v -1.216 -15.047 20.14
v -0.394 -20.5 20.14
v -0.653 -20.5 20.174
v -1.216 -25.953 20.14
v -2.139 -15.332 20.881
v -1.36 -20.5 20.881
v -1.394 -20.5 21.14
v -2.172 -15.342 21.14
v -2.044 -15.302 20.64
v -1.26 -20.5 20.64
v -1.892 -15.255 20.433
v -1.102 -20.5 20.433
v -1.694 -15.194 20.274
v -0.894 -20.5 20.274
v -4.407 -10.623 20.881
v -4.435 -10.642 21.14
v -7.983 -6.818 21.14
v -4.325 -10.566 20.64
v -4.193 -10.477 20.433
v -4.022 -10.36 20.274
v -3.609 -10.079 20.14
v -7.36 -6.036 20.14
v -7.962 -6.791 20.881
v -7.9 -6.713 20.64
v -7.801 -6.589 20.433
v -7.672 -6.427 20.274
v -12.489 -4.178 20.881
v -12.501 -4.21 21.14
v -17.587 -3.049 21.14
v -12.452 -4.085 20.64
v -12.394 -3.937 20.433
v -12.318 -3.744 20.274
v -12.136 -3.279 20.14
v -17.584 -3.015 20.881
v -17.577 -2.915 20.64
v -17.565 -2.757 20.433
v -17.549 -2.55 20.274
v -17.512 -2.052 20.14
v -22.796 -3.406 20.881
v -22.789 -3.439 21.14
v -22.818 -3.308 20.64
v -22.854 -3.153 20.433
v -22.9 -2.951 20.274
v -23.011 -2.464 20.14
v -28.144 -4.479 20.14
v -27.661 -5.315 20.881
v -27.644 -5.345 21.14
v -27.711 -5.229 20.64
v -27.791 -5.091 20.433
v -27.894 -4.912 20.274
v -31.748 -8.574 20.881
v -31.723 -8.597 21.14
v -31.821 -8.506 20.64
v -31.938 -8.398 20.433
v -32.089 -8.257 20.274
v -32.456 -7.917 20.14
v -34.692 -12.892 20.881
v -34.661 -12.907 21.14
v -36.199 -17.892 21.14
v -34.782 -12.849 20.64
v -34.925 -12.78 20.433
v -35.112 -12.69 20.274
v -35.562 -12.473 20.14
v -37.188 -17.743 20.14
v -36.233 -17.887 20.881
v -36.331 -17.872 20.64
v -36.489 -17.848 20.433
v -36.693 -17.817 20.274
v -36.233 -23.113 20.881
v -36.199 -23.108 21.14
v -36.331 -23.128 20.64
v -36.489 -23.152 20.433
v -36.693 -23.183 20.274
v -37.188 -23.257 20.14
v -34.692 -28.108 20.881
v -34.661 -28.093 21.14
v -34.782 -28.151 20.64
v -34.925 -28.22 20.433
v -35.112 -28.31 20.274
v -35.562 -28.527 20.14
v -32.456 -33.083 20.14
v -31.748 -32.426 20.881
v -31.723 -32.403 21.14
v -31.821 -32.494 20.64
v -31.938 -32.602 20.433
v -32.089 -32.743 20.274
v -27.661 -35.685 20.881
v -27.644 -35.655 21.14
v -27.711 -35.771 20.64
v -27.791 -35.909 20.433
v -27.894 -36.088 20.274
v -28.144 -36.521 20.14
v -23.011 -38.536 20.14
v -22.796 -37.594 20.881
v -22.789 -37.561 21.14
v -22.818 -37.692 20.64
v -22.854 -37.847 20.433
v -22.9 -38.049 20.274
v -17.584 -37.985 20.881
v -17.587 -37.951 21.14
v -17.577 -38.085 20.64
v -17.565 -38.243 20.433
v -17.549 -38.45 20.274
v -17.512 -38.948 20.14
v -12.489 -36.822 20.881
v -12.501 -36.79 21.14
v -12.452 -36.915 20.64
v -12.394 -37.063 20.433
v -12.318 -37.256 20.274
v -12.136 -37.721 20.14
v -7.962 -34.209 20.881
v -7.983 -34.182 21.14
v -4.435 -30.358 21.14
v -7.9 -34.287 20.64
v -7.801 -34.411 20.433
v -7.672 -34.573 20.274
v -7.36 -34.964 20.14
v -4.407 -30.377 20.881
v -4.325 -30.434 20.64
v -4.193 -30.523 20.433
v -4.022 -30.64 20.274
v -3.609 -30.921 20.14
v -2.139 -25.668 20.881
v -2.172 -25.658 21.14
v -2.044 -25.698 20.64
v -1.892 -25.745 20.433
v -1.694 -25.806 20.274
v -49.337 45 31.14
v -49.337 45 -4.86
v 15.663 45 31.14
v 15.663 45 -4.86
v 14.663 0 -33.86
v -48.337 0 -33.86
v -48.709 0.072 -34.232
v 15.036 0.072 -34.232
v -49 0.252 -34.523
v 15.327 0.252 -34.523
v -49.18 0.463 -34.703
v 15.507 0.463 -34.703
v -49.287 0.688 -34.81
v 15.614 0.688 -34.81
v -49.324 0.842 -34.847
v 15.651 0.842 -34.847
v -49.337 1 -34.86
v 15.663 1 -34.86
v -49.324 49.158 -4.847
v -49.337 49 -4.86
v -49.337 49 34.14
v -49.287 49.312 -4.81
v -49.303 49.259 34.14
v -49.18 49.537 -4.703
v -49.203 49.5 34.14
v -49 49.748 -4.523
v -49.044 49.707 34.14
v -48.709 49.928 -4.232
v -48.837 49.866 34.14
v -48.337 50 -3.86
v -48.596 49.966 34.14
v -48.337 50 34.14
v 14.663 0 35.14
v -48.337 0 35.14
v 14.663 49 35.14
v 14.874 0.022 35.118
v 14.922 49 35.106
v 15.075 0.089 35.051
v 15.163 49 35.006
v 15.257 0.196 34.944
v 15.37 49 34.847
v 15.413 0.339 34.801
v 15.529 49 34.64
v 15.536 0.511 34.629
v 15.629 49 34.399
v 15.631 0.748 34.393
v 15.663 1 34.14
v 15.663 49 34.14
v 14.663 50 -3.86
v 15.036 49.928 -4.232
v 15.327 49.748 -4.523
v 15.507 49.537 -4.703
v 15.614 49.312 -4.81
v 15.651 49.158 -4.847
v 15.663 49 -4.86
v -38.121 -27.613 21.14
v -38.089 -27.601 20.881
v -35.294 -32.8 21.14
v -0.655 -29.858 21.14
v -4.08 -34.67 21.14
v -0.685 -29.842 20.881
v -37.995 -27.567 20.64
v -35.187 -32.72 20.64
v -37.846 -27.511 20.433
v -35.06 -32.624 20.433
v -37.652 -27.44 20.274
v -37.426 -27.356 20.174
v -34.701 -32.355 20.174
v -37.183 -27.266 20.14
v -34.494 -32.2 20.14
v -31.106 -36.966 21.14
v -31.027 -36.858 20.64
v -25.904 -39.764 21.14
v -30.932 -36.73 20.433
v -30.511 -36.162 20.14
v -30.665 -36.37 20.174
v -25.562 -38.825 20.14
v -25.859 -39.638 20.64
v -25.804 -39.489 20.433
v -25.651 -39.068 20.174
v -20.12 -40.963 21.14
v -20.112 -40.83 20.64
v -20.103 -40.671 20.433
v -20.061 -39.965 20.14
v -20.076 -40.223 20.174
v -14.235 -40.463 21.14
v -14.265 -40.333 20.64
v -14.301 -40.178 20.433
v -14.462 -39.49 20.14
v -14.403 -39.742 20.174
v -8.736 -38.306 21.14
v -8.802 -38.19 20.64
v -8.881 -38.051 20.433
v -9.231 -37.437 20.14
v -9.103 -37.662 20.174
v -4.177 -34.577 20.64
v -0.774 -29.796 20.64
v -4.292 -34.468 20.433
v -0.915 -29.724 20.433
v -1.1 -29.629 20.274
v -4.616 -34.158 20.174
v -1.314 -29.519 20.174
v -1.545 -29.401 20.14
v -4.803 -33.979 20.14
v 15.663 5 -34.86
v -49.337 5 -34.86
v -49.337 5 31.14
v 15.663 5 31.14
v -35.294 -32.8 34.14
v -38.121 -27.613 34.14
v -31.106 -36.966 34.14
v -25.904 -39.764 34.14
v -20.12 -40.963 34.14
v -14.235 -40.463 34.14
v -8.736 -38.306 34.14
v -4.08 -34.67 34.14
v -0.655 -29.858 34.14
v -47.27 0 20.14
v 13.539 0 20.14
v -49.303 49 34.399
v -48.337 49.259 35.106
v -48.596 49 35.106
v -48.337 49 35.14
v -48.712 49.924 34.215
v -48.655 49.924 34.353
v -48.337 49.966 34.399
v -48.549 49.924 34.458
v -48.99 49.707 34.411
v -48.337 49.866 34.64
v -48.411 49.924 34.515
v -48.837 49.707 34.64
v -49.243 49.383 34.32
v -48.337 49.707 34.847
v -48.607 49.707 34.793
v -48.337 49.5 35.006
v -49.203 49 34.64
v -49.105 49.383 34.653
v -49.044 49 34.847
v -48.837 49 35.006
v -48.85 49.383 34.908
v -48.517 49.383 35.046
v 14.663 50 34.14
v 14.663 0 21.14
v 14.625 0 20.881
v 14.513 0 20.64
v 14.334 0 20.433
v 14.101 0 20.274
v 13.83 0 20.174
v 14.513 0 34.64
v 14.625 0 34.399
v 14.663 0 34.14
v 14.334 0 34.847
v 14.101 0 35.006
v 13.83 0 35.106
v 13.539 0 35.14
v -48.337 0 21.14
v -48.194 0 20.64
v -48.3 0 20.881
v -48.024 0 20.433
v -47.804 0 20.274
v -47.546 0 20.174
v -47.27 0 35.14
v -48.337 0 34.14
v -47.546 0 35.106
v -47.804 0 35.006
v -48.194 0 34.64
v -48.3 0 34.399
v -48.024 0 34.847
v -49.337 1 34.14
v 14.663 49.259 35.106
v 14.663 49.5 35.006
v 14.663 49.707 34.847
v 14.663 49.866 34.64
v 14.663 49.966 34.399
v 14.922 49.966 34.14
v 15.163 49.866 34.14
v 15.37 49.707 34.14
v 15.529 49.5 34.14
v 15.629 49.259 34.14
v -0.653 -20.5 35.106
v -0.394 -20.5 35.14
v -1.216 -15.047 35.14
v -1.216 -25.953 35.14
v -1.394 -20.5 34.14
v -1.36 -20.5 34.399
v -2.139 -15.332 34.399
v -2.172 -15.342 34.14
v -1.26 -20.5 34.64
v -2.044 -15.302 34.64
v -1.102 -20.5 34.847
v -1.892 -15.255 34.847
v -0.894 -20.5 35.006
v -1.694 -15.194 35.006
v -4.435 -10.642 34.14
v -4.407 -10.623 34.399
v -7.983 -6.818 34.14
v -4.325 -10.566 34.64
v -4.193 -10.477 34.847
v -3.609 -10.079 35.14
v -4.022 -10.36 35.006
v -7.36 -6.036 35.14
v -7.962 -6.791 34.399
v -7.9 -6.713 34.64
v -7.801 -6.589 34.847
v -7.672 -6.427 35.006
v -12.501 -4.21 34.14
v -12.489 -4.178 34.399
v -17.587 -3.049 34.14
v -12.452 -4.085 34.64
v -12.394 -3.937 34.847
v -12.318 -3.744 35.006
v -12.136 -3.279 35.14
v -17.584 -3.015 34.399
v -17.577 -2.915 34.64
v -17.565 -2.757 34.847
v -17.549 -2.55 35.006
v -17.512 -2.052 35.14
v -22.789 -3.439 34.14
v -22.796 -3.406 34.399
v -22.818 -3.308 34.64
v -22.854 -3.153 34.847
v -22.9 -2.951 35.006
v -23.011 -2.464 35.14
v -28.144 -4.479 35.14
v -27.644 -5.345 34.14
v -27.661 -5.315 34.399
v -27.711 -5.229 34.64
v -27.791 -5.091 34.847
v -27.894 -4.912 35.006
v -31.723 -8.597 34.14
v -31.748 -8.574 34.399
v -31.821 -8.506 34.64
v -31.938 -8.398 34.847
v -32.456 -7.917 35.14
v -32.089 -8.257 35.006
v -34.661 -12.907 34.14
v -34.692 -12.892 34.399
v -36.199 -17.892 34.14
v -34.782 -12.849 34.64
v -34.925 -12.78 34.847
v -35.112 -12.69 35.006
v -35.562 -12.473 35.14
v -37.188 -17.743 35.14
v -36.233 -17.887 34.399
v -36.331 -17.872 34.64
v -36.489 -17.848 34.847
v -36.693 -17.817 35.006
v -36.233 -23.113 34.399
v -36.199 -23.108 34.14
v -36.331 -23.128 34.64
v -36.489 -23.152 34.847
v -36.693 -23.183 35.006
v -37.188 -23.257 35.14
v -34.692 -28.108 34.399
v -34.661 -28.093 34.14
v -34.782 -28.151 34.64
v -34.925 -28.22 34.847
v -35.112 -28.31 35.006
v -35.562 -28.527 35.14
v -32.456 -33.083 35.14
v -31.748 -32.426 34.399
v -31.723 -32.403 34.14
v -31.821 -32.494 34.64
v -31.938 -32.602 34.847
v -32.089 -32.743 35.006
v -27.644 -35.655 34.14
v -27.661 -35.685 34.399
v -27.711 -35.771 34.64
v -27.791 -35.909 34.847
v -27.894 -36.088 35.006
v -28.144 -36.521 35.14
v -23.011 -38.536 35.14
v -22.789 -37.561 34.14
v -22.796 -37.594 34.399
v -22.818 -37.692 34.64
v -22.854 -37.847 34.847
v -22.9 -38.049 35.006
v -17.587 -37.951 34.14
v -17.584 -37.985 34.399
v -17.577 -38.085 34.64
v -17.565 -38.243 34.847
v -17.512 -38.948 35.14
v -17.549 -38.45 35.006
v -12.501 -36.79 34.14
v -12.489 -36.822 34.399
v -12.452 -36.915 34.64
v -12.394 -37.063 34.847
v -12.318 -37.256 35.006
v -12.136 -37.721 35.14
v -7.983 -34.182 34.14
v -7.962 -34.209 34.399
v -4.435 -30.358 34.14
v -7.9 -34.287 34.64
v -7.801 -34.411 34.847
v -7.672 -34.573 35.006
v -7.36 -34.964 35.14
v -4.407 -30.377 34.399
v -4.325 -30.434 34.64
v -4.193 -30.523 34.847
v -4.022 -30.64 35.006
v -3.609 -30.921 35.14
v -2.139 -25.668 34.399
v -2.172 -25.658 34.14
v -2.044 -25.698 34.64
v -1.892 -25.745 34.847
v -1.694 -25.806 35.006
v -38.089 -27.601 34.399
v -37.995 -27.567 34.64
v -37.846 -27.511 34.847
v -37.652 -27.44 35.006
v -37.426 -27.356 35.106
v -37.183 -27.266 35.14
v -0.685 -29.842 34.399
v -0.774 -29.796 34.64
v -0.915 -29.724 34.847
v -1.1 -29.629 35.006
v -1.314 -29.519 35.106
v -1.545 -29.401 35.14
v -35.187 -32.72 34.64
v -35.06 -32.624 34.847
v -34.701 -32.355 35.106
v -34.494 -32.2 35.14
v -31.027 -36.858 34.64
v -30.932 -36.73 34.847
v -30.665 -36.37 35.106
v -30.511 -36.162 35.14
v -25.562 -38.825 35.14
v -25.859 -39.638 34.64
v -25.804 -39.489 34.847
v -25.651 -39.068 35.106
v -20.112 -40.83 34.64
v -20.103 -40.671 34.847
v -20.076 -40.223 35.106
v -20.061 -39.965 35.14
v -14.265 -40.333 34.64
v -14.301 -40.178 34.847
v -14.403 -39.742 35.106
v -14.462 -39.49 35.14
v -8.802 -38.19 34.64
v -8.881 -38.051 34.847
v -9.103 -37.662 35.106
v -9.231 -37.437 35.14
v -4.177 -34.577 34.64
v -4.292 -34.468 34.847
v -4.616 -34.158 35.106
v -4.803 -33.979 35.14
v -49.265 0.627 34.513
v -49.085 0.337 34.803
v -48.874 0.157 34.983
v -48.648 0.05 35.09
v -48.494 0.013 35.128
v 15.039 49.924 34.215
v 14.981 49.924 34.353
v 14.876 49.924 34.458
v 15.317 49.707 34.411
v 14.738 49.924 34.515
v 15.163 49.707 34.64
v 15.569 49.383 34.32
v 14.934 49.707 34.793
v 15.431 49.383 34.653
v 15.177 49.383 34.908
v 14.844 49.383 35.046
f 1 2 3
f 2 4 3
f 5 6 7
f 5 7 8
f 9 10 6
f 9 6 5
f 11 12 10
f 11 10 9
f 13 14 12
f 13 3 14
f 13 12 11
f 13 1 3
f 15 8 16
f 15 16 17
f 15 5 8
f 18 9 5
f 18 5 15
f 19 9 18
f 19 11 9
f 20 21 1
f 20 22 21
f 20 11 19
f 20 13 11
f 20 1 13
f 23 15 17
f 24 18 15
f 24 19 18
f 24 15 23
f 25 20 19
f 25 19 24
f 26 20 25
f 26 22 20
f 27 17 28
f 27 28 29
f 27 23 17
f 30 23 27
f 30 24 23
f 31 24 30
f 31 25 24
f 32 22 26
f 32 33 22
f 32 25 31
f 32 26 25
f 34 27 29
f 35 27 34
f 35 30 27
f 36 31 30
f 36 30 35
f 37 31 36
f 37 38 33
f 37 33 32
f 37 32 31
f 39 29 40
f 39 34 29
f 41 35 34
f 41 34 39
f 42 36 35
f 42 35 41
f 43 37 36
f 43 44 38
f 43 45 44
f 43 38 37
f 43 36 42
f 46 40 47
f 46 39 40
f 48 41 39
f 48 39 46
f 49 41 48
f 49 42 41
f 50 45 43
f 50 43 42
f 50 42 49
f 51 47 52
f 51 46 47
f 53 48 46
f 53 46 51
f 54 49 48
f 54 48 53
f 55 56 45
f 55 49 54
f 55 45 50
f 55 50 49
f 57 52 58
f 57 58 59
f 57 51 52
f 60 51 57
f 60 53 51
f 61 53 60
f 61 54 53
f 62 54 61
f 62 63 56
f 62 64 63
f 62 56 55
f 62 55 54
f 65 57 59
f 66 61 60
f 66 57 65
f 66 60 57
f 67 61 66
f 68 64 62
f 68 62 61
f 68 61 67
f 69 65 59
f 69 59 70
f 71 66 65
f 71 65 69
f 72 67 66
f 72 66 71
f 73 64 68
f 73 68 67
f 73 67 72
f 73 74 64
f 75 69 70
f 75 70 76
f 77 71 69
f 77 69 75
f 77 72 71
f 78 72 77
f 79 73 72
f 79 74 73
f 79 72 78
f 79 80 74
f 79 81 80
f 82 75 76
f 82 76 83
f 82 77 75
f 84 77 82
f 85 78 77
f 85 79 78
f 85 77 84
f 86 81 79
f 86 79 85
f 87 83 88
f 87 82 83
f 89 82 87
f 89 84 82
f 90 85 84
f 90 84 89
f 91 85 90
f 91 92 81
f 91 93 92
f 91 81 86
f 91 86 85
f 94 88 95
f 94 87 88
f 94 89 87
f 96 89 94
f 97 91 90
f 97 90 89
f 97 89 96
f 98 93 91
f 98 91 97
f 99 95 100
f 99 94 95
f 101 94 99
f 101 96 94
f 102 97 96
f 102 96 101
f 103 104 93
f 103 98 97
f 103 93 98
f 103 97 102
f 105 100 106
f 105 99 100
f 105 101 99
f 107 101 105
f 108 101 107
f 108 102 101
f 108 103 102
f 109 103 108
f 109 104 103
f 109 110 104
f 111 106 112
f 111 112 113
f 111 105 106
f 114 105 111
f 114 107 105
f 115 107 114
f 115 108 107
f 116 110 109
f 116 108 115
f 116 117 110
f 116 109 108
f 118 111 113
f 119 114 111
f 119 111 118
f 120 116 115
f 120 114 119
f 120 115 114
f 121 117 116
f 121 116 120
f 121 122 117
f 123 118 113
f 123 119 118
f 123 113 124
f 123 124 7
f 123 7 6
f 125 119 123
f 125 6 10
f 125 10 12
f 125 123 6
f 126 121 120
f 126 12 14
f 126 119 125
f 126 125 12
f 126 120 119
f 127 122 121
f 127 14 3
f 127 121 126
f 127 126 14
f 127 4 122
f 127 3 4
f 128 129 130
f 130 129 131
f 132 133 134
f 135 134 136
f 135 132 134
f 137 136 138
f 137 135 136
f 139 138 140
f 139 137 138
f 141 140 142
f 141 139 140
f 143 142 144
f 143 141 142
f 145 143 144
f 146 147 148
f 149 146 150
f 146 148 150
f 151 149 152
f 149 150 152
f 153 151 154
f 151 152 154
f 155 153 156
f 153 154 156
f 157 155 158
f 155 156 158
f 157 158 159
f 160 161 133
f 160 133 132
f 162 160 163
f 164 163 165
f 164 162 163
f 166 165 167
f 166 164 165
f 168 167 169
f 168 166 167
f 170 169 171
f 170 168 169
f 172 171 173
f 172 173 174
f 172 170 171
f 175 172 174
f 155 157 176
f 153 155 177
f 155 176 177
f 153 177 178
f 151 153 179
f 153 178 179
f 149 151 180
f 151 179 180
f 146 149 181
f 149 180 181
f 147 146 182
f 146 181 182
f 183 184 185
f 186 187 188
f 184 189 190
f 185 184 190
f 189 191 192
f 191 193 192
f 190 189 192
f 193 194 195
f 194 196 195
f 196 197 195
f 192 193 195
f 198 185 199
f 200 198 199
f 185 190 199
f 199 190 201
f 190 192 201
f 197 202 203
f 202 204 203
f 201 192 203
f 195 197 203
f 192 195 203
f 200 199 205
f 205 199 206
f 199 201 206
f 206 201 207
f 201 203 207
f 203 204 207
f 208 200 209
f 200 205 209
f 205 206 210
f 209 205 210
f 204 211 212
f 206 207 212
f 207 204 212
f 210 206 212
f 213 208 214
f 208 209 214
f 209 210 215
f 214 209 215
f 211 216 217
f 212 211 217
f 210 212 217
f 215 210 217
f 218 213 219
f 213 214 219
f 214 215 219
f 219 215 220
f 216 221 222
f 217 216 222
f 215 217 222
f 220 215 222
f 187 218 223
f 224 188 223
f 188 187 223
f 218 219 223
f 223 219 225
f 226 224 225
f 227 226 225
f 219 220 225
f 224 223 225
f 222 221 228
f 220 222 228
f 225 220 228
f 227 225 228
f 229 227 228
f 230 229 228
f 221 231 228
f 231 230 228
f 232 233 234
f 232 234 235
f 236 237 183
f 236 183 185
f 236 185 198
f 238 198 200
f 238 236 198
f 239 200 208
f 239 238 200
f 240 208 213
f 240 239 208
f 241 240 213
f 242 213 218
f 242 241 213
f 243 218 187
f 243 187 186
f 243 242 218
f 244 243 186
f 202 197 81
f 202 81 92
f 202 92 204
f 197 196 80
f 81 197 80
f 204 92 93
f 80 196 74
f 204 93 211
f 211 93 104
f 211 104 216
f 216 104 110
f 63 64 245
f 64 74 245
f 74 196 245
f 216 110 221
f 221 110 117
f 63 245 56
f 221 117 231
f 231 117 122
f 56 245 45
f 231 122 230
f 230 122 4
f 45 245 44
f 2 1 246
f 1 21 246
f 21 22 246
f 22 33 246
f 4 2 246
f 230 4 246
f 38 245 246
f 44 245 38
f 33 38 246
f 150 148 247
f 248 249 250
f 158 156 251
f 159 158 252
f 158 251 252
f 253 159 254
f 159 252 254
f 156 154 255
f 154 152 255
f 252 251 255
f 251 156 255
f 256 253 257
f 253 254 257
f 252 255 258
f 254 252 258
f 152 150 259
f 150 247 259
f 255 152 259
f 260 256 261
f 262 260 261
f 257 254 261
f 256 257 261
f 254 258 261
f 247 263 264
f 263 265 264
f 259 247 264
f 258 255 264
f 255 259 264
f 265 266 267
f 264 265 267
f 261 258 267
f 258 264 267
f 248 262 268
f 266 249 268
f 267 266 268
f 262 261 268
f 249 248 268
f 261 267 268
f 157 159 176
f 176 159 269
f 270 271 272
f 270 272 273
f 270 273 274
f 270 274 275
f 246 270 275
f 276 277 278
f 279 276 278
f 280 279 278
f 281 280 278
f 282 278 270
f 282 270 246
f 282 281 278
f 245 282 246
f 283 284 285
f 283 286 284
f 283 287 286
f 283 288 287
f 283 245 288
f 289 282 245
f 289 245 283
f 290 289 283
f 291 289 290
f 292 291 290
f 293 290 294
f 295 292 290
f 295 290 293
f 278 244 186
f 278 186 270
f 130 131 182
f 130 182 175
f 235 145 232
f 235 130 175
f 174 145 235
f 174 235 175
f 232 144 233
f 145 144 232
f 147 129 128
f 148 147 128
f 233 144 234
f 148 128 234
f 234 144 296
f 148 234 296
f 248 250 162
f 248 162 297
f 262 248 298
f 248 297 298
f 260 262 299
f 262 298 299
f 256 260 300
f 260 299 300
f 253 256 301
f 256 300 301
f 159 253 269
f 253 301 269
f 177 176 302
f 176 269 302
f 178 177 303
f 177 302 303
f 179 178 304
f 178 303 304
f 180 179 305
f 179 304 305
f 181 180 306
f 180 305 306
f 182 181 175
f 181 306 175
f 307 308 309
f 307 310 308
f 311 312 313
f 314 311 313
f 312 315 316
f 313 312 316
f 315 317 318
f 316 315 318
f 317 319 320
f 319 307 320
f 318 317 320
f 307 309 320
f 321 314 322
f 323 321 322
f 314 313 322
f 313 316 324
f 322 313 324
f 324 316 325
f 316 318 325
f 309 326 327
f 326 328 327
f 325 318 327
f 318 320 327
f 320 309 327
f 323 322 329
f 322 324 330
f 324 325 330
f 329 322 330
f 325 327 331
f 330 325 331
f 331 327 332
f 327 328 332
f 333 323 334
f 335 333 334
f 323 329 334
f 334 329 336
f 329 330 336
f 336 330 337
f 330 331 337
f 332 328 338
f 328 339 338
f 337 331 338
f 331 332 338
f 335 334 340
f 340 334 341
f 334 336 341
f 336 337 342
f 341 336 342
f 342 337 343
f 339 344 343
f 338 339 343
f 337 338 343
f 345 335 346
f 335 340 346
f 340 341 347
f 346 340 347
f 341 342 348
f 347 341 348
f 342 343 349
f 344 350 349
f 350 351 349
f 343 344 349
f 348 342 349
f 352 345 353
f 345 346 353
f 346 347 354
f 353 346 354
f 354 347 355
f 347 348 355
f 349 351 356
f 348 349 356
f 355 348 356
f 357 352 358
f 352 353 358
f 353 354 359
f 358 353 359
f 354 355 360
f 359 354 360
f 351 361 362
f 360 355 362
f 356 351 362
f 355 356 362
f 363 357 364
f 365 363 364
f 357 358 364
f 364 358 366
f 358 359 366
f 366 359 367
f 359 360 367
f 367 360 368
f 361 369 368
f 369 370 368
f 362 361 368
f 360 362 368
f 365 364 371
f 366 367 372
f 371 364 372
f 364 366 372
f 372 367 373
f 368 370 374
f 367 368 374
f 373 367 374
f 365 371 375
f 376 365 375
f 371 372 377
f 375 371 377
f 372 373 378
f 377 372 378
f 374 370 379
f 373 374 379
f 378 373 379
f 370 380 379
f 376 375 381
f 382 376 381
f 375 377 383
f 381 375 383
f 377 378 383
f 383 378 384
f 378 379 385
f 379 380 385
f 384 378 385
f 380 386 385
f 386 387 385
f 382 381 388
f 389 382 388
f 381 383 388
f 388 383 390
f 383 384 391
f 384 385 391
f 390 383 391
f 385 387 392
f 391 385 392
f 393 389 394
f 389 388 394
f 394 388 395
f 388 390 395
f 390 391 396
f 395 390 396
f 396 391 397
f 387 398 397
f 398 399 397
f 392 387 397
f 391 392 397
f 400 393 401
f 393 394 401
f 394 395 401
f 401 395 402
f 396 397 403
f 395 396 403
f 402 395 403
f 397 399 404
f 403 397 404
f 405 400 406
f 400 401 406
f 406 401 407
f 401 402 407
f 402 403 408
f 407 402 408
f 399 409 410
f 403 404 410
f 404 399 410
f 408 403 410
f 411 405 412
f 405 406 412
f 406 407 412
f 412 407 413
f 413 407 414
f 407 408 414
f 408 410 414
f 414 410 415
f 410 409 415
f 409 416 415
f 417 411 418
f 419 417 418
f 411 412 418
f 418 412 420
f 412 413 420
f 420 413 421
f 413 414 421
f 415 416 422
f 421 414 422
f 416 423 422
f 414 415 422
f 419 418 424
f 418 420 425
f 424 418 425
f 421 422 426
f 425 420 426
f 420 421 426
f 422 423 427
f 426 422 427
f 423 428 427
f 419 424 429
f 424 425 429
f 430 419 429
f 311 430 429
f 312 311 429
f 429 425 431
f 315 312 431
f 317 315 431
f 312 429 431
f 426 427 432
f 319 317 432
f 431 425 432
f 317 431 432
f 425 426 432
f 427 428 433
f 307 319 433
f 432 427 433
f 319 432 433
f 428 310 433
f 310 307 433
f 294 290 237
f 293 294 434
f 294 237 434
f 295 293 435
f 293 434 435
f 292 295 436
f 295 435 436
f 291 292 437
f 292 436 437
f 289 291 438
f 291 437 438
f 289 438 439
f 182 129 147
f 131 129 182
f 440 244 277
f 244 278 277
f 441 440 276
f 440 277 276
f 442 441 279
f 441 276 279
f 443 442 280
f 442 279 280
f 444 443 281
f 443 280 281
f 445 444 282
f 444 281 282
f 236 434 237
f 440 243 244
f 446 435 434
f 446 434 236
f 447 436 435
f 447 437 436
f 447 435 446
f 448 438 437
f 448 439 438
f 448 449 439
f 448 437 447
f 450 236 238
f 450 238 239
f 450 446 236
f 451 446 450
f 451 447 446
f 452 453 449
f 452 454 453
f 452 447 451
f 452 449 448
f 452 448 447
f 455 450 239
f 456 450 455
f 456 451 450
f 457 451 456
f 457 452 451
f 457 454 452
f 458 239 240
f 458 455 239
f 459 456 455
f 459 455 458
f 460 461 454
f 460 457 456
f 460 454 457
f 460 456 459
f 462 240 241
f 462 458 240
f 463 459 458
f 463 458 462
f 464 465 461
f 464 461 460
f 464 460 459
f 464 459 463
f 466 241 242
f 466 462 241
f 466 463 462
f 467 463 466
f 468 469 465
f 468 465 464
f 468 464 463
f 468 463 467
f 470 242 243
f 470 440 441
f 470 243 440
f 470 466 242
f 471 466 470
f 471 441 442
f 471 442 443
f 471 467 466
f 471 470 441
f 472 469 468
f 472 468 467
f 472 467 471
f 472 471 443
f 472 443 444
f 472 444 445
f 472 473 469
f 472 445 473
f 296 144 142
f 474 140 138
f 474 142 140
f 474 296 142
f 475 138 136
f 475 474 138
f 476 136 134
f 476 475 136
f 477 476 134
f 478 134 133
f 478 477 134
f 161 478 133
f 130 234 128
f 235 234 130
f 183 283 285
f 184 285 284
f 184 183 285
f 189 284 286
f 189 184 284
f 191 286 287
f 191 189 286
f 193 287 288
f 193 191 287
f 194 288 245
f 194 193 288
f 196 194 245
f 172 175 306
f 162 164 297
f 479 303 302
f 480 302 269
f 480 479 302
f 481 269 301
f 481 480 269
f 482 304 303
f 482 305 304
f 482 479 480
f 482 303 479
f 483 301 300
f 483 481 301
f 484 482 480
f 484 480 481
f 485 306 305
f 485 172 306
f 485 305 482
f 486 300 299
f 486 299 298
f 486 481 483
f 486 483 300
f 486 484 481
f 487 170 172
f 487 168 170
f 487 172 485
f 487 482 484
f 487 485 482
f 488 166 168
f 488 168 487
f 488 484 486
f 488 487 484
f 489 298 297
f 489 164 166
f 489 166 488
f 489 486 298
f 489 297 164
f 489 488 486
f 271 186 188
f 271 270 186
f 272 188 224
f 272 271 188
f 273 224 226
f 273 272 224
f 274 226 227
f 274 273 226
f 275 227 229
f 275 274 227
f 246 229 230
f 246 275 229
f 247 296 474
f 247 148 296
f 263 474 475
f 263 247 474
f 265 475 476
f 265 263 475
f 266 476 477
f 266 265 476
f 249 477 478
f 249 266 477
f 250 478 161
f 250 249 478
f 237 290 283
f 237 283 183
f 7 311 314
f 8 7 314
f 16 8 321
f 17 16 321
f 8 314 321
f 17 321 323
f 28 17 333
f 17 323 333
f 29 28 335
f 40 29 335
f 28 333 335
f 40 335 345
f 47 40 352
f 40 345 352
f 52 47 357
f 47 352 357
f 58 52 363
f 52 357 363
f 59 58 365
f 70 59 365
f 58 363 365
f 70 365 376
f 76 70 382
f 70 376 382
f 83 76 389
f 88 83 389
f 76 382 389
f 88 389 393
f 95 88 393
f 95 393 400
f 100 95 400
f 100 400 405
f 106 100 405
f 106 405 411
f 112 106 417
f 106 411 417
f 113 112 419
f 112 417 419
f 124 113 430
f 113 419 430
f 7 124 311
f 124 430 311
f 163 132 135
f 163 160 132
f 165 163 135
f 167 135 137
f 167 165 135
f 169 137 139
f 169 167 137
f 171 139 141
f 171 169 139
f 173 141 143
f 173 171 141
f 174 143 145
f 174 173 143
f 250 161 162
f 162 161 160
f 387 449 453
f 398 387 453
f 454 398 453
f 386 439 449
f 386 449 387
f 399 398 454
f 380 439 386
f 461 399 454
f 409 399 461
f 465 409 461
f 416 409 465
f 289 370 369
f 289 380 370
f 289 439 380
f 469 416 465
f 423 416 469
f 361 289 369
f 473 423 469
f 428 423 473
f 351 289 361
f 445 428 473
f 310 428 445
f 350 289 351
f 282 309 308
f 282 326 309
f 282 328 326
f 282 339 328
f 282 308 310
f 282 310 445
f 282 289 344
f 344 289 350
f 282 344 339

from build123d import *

# Parameters (mm, degrees)
F0_W     = 65
F0_H     = 70
F1_DEPTH = 50
F2_W     = 65
F2_H     = 40
F3_DEPTH = 66
F4_DEPTH = 30
F5_R     = 17.5
F6_DEPTH = 25
F7_DEPTH = 15
F8_R     = 1
F8_2_R   = 1


with BuildPart() as f1:
    # F0 (on Front) → F1 (new body)
    with BuildSketch(Plane.XZ):
        with Locations((-16.8366907164, 0.1400746397)):
            Rectangle(F0_W, F0_H)
    extrude(amount=-F1_DEPTH)

    # F2 (on face) → F3 (cut, through all)
    with BuildSketch(Plane(origin=(0, 0, -34.8599253603), x_dir=(1, 0, 0), z_dir=(0, 0, -1))):
        with Locations((-16.8366907164, -25)):
            Rectangle(F2_W, F2_H)
    extrude(amount=-F3_DEPTH, mode=Mode.SUBTRACT)

    # F4 (cut, through all): a face of the model
    f4_faces = [f1.faces().sort_by_distance(p)[0] for p in [
        (-16.8366907164, 47.5, -34.8599253603),
    ]]
    extrude(f4_faces, amount=-F4_DEPTH, mode=Mode.SUBTRACT)

    # F5 (on face) → F6 (cut)
    with BuildSketch(Plane.XY.offset(35.1400746397)):
        with Locations((-18.8944296206, -20.5)):
            Circle(F5_R)
    extrude(amount=-F6_DEPTH, mode=Mode.SUBTRACT)

    # F8#2
    f8_2_edges = [f1.edges().sort_by_distance(p)[0] for p in [
        (15.663309, 25, 35.140075),
        (-49.336691, 25, 35.140075),
        (-16.836691, 50, -4.859925),
        (15.663309, 50, 15.140075),
        (-49.336691, 50, 15.140075),
        (-16.836691, 0, -34.859925),
        (-16.836691, 50, 35.140075),
        (-49.336691, 0, 0.140075),
        (15.663309, 0, 0.140075),
    ]]
    fillet(f8_2_edges, radius=F8_2_R)


with BuildPart() as f7:
    # F5 (on face) → F7 (new body)
    with BuildSketch(Plane.XY.offset(35.1400746397)):
        with BuildLine():
            Line((-48.3366907164, 0), (-38.1208169713, -27.6130886006))
            ThreePointArc((-38.1208169713, -27.6130886006), (-35.718048677, -8.7860834114), (-18.8944296206, 0))
            Line((-18.8944296206, 0), (-48.3366907164, 0))
        make_face()
        with BuildLine():
            ThreePointArc((1.6055703794, -20.5), (1.0324718437, -25.3133769884), (-0.6547806482, -29.8576281911))
            Line((-0.6547806482, -29.8576281911), (14.6633092836, 0))
            Line((14.6633092836, 0), (-18.8944296206, 0))
            ThreePointArc((-18.8944296206, 0), (-4.3987406062, -6.0043109857), (1.6055703794, -20.5))
        make_face()
        with BuildLine():
            ThreePointArc((-18.8944296206, 0), (-35.718048677, -8.7860834114), (-38.1208169713, -27.6130886006))
            ThreePointArc((-38.1208169713, -27.6130886006), (-20.1203589212, -40.9633110065), (-0.6547806482, -29.8576281911))
            ThreePointArc((-0.6547806482, -29.8576281911), (1.0324718437, -25.3133769884), (1.6055703794, -20.5))
            ThreePointArc((1.6055703794, -20.5), (-4.3987406062, -6.0043109857), (-18.8944296206, 0))
        make_face()
        with Locations((-18.8944296206, -20.5)):
            Circle(F5_R, mode=Mode.SUBTRACT)
    extrude(amount=-F7_DEPTH)

    # F8
    f8_edges = [f7.edges().sort_by_distance(p)[0] for p in [
        (-43.228754, -13.806544, 35.140075),
        (-36.39443, -20.5, 35.140075),
        (-43.228754, -13.806544, 20.140075),
        (-36.39443, -20.5, 20.140075),
    ]]
    fillet(f8_edges, radius=F8_R)


solid = Compound([f1.part, f7.part])
